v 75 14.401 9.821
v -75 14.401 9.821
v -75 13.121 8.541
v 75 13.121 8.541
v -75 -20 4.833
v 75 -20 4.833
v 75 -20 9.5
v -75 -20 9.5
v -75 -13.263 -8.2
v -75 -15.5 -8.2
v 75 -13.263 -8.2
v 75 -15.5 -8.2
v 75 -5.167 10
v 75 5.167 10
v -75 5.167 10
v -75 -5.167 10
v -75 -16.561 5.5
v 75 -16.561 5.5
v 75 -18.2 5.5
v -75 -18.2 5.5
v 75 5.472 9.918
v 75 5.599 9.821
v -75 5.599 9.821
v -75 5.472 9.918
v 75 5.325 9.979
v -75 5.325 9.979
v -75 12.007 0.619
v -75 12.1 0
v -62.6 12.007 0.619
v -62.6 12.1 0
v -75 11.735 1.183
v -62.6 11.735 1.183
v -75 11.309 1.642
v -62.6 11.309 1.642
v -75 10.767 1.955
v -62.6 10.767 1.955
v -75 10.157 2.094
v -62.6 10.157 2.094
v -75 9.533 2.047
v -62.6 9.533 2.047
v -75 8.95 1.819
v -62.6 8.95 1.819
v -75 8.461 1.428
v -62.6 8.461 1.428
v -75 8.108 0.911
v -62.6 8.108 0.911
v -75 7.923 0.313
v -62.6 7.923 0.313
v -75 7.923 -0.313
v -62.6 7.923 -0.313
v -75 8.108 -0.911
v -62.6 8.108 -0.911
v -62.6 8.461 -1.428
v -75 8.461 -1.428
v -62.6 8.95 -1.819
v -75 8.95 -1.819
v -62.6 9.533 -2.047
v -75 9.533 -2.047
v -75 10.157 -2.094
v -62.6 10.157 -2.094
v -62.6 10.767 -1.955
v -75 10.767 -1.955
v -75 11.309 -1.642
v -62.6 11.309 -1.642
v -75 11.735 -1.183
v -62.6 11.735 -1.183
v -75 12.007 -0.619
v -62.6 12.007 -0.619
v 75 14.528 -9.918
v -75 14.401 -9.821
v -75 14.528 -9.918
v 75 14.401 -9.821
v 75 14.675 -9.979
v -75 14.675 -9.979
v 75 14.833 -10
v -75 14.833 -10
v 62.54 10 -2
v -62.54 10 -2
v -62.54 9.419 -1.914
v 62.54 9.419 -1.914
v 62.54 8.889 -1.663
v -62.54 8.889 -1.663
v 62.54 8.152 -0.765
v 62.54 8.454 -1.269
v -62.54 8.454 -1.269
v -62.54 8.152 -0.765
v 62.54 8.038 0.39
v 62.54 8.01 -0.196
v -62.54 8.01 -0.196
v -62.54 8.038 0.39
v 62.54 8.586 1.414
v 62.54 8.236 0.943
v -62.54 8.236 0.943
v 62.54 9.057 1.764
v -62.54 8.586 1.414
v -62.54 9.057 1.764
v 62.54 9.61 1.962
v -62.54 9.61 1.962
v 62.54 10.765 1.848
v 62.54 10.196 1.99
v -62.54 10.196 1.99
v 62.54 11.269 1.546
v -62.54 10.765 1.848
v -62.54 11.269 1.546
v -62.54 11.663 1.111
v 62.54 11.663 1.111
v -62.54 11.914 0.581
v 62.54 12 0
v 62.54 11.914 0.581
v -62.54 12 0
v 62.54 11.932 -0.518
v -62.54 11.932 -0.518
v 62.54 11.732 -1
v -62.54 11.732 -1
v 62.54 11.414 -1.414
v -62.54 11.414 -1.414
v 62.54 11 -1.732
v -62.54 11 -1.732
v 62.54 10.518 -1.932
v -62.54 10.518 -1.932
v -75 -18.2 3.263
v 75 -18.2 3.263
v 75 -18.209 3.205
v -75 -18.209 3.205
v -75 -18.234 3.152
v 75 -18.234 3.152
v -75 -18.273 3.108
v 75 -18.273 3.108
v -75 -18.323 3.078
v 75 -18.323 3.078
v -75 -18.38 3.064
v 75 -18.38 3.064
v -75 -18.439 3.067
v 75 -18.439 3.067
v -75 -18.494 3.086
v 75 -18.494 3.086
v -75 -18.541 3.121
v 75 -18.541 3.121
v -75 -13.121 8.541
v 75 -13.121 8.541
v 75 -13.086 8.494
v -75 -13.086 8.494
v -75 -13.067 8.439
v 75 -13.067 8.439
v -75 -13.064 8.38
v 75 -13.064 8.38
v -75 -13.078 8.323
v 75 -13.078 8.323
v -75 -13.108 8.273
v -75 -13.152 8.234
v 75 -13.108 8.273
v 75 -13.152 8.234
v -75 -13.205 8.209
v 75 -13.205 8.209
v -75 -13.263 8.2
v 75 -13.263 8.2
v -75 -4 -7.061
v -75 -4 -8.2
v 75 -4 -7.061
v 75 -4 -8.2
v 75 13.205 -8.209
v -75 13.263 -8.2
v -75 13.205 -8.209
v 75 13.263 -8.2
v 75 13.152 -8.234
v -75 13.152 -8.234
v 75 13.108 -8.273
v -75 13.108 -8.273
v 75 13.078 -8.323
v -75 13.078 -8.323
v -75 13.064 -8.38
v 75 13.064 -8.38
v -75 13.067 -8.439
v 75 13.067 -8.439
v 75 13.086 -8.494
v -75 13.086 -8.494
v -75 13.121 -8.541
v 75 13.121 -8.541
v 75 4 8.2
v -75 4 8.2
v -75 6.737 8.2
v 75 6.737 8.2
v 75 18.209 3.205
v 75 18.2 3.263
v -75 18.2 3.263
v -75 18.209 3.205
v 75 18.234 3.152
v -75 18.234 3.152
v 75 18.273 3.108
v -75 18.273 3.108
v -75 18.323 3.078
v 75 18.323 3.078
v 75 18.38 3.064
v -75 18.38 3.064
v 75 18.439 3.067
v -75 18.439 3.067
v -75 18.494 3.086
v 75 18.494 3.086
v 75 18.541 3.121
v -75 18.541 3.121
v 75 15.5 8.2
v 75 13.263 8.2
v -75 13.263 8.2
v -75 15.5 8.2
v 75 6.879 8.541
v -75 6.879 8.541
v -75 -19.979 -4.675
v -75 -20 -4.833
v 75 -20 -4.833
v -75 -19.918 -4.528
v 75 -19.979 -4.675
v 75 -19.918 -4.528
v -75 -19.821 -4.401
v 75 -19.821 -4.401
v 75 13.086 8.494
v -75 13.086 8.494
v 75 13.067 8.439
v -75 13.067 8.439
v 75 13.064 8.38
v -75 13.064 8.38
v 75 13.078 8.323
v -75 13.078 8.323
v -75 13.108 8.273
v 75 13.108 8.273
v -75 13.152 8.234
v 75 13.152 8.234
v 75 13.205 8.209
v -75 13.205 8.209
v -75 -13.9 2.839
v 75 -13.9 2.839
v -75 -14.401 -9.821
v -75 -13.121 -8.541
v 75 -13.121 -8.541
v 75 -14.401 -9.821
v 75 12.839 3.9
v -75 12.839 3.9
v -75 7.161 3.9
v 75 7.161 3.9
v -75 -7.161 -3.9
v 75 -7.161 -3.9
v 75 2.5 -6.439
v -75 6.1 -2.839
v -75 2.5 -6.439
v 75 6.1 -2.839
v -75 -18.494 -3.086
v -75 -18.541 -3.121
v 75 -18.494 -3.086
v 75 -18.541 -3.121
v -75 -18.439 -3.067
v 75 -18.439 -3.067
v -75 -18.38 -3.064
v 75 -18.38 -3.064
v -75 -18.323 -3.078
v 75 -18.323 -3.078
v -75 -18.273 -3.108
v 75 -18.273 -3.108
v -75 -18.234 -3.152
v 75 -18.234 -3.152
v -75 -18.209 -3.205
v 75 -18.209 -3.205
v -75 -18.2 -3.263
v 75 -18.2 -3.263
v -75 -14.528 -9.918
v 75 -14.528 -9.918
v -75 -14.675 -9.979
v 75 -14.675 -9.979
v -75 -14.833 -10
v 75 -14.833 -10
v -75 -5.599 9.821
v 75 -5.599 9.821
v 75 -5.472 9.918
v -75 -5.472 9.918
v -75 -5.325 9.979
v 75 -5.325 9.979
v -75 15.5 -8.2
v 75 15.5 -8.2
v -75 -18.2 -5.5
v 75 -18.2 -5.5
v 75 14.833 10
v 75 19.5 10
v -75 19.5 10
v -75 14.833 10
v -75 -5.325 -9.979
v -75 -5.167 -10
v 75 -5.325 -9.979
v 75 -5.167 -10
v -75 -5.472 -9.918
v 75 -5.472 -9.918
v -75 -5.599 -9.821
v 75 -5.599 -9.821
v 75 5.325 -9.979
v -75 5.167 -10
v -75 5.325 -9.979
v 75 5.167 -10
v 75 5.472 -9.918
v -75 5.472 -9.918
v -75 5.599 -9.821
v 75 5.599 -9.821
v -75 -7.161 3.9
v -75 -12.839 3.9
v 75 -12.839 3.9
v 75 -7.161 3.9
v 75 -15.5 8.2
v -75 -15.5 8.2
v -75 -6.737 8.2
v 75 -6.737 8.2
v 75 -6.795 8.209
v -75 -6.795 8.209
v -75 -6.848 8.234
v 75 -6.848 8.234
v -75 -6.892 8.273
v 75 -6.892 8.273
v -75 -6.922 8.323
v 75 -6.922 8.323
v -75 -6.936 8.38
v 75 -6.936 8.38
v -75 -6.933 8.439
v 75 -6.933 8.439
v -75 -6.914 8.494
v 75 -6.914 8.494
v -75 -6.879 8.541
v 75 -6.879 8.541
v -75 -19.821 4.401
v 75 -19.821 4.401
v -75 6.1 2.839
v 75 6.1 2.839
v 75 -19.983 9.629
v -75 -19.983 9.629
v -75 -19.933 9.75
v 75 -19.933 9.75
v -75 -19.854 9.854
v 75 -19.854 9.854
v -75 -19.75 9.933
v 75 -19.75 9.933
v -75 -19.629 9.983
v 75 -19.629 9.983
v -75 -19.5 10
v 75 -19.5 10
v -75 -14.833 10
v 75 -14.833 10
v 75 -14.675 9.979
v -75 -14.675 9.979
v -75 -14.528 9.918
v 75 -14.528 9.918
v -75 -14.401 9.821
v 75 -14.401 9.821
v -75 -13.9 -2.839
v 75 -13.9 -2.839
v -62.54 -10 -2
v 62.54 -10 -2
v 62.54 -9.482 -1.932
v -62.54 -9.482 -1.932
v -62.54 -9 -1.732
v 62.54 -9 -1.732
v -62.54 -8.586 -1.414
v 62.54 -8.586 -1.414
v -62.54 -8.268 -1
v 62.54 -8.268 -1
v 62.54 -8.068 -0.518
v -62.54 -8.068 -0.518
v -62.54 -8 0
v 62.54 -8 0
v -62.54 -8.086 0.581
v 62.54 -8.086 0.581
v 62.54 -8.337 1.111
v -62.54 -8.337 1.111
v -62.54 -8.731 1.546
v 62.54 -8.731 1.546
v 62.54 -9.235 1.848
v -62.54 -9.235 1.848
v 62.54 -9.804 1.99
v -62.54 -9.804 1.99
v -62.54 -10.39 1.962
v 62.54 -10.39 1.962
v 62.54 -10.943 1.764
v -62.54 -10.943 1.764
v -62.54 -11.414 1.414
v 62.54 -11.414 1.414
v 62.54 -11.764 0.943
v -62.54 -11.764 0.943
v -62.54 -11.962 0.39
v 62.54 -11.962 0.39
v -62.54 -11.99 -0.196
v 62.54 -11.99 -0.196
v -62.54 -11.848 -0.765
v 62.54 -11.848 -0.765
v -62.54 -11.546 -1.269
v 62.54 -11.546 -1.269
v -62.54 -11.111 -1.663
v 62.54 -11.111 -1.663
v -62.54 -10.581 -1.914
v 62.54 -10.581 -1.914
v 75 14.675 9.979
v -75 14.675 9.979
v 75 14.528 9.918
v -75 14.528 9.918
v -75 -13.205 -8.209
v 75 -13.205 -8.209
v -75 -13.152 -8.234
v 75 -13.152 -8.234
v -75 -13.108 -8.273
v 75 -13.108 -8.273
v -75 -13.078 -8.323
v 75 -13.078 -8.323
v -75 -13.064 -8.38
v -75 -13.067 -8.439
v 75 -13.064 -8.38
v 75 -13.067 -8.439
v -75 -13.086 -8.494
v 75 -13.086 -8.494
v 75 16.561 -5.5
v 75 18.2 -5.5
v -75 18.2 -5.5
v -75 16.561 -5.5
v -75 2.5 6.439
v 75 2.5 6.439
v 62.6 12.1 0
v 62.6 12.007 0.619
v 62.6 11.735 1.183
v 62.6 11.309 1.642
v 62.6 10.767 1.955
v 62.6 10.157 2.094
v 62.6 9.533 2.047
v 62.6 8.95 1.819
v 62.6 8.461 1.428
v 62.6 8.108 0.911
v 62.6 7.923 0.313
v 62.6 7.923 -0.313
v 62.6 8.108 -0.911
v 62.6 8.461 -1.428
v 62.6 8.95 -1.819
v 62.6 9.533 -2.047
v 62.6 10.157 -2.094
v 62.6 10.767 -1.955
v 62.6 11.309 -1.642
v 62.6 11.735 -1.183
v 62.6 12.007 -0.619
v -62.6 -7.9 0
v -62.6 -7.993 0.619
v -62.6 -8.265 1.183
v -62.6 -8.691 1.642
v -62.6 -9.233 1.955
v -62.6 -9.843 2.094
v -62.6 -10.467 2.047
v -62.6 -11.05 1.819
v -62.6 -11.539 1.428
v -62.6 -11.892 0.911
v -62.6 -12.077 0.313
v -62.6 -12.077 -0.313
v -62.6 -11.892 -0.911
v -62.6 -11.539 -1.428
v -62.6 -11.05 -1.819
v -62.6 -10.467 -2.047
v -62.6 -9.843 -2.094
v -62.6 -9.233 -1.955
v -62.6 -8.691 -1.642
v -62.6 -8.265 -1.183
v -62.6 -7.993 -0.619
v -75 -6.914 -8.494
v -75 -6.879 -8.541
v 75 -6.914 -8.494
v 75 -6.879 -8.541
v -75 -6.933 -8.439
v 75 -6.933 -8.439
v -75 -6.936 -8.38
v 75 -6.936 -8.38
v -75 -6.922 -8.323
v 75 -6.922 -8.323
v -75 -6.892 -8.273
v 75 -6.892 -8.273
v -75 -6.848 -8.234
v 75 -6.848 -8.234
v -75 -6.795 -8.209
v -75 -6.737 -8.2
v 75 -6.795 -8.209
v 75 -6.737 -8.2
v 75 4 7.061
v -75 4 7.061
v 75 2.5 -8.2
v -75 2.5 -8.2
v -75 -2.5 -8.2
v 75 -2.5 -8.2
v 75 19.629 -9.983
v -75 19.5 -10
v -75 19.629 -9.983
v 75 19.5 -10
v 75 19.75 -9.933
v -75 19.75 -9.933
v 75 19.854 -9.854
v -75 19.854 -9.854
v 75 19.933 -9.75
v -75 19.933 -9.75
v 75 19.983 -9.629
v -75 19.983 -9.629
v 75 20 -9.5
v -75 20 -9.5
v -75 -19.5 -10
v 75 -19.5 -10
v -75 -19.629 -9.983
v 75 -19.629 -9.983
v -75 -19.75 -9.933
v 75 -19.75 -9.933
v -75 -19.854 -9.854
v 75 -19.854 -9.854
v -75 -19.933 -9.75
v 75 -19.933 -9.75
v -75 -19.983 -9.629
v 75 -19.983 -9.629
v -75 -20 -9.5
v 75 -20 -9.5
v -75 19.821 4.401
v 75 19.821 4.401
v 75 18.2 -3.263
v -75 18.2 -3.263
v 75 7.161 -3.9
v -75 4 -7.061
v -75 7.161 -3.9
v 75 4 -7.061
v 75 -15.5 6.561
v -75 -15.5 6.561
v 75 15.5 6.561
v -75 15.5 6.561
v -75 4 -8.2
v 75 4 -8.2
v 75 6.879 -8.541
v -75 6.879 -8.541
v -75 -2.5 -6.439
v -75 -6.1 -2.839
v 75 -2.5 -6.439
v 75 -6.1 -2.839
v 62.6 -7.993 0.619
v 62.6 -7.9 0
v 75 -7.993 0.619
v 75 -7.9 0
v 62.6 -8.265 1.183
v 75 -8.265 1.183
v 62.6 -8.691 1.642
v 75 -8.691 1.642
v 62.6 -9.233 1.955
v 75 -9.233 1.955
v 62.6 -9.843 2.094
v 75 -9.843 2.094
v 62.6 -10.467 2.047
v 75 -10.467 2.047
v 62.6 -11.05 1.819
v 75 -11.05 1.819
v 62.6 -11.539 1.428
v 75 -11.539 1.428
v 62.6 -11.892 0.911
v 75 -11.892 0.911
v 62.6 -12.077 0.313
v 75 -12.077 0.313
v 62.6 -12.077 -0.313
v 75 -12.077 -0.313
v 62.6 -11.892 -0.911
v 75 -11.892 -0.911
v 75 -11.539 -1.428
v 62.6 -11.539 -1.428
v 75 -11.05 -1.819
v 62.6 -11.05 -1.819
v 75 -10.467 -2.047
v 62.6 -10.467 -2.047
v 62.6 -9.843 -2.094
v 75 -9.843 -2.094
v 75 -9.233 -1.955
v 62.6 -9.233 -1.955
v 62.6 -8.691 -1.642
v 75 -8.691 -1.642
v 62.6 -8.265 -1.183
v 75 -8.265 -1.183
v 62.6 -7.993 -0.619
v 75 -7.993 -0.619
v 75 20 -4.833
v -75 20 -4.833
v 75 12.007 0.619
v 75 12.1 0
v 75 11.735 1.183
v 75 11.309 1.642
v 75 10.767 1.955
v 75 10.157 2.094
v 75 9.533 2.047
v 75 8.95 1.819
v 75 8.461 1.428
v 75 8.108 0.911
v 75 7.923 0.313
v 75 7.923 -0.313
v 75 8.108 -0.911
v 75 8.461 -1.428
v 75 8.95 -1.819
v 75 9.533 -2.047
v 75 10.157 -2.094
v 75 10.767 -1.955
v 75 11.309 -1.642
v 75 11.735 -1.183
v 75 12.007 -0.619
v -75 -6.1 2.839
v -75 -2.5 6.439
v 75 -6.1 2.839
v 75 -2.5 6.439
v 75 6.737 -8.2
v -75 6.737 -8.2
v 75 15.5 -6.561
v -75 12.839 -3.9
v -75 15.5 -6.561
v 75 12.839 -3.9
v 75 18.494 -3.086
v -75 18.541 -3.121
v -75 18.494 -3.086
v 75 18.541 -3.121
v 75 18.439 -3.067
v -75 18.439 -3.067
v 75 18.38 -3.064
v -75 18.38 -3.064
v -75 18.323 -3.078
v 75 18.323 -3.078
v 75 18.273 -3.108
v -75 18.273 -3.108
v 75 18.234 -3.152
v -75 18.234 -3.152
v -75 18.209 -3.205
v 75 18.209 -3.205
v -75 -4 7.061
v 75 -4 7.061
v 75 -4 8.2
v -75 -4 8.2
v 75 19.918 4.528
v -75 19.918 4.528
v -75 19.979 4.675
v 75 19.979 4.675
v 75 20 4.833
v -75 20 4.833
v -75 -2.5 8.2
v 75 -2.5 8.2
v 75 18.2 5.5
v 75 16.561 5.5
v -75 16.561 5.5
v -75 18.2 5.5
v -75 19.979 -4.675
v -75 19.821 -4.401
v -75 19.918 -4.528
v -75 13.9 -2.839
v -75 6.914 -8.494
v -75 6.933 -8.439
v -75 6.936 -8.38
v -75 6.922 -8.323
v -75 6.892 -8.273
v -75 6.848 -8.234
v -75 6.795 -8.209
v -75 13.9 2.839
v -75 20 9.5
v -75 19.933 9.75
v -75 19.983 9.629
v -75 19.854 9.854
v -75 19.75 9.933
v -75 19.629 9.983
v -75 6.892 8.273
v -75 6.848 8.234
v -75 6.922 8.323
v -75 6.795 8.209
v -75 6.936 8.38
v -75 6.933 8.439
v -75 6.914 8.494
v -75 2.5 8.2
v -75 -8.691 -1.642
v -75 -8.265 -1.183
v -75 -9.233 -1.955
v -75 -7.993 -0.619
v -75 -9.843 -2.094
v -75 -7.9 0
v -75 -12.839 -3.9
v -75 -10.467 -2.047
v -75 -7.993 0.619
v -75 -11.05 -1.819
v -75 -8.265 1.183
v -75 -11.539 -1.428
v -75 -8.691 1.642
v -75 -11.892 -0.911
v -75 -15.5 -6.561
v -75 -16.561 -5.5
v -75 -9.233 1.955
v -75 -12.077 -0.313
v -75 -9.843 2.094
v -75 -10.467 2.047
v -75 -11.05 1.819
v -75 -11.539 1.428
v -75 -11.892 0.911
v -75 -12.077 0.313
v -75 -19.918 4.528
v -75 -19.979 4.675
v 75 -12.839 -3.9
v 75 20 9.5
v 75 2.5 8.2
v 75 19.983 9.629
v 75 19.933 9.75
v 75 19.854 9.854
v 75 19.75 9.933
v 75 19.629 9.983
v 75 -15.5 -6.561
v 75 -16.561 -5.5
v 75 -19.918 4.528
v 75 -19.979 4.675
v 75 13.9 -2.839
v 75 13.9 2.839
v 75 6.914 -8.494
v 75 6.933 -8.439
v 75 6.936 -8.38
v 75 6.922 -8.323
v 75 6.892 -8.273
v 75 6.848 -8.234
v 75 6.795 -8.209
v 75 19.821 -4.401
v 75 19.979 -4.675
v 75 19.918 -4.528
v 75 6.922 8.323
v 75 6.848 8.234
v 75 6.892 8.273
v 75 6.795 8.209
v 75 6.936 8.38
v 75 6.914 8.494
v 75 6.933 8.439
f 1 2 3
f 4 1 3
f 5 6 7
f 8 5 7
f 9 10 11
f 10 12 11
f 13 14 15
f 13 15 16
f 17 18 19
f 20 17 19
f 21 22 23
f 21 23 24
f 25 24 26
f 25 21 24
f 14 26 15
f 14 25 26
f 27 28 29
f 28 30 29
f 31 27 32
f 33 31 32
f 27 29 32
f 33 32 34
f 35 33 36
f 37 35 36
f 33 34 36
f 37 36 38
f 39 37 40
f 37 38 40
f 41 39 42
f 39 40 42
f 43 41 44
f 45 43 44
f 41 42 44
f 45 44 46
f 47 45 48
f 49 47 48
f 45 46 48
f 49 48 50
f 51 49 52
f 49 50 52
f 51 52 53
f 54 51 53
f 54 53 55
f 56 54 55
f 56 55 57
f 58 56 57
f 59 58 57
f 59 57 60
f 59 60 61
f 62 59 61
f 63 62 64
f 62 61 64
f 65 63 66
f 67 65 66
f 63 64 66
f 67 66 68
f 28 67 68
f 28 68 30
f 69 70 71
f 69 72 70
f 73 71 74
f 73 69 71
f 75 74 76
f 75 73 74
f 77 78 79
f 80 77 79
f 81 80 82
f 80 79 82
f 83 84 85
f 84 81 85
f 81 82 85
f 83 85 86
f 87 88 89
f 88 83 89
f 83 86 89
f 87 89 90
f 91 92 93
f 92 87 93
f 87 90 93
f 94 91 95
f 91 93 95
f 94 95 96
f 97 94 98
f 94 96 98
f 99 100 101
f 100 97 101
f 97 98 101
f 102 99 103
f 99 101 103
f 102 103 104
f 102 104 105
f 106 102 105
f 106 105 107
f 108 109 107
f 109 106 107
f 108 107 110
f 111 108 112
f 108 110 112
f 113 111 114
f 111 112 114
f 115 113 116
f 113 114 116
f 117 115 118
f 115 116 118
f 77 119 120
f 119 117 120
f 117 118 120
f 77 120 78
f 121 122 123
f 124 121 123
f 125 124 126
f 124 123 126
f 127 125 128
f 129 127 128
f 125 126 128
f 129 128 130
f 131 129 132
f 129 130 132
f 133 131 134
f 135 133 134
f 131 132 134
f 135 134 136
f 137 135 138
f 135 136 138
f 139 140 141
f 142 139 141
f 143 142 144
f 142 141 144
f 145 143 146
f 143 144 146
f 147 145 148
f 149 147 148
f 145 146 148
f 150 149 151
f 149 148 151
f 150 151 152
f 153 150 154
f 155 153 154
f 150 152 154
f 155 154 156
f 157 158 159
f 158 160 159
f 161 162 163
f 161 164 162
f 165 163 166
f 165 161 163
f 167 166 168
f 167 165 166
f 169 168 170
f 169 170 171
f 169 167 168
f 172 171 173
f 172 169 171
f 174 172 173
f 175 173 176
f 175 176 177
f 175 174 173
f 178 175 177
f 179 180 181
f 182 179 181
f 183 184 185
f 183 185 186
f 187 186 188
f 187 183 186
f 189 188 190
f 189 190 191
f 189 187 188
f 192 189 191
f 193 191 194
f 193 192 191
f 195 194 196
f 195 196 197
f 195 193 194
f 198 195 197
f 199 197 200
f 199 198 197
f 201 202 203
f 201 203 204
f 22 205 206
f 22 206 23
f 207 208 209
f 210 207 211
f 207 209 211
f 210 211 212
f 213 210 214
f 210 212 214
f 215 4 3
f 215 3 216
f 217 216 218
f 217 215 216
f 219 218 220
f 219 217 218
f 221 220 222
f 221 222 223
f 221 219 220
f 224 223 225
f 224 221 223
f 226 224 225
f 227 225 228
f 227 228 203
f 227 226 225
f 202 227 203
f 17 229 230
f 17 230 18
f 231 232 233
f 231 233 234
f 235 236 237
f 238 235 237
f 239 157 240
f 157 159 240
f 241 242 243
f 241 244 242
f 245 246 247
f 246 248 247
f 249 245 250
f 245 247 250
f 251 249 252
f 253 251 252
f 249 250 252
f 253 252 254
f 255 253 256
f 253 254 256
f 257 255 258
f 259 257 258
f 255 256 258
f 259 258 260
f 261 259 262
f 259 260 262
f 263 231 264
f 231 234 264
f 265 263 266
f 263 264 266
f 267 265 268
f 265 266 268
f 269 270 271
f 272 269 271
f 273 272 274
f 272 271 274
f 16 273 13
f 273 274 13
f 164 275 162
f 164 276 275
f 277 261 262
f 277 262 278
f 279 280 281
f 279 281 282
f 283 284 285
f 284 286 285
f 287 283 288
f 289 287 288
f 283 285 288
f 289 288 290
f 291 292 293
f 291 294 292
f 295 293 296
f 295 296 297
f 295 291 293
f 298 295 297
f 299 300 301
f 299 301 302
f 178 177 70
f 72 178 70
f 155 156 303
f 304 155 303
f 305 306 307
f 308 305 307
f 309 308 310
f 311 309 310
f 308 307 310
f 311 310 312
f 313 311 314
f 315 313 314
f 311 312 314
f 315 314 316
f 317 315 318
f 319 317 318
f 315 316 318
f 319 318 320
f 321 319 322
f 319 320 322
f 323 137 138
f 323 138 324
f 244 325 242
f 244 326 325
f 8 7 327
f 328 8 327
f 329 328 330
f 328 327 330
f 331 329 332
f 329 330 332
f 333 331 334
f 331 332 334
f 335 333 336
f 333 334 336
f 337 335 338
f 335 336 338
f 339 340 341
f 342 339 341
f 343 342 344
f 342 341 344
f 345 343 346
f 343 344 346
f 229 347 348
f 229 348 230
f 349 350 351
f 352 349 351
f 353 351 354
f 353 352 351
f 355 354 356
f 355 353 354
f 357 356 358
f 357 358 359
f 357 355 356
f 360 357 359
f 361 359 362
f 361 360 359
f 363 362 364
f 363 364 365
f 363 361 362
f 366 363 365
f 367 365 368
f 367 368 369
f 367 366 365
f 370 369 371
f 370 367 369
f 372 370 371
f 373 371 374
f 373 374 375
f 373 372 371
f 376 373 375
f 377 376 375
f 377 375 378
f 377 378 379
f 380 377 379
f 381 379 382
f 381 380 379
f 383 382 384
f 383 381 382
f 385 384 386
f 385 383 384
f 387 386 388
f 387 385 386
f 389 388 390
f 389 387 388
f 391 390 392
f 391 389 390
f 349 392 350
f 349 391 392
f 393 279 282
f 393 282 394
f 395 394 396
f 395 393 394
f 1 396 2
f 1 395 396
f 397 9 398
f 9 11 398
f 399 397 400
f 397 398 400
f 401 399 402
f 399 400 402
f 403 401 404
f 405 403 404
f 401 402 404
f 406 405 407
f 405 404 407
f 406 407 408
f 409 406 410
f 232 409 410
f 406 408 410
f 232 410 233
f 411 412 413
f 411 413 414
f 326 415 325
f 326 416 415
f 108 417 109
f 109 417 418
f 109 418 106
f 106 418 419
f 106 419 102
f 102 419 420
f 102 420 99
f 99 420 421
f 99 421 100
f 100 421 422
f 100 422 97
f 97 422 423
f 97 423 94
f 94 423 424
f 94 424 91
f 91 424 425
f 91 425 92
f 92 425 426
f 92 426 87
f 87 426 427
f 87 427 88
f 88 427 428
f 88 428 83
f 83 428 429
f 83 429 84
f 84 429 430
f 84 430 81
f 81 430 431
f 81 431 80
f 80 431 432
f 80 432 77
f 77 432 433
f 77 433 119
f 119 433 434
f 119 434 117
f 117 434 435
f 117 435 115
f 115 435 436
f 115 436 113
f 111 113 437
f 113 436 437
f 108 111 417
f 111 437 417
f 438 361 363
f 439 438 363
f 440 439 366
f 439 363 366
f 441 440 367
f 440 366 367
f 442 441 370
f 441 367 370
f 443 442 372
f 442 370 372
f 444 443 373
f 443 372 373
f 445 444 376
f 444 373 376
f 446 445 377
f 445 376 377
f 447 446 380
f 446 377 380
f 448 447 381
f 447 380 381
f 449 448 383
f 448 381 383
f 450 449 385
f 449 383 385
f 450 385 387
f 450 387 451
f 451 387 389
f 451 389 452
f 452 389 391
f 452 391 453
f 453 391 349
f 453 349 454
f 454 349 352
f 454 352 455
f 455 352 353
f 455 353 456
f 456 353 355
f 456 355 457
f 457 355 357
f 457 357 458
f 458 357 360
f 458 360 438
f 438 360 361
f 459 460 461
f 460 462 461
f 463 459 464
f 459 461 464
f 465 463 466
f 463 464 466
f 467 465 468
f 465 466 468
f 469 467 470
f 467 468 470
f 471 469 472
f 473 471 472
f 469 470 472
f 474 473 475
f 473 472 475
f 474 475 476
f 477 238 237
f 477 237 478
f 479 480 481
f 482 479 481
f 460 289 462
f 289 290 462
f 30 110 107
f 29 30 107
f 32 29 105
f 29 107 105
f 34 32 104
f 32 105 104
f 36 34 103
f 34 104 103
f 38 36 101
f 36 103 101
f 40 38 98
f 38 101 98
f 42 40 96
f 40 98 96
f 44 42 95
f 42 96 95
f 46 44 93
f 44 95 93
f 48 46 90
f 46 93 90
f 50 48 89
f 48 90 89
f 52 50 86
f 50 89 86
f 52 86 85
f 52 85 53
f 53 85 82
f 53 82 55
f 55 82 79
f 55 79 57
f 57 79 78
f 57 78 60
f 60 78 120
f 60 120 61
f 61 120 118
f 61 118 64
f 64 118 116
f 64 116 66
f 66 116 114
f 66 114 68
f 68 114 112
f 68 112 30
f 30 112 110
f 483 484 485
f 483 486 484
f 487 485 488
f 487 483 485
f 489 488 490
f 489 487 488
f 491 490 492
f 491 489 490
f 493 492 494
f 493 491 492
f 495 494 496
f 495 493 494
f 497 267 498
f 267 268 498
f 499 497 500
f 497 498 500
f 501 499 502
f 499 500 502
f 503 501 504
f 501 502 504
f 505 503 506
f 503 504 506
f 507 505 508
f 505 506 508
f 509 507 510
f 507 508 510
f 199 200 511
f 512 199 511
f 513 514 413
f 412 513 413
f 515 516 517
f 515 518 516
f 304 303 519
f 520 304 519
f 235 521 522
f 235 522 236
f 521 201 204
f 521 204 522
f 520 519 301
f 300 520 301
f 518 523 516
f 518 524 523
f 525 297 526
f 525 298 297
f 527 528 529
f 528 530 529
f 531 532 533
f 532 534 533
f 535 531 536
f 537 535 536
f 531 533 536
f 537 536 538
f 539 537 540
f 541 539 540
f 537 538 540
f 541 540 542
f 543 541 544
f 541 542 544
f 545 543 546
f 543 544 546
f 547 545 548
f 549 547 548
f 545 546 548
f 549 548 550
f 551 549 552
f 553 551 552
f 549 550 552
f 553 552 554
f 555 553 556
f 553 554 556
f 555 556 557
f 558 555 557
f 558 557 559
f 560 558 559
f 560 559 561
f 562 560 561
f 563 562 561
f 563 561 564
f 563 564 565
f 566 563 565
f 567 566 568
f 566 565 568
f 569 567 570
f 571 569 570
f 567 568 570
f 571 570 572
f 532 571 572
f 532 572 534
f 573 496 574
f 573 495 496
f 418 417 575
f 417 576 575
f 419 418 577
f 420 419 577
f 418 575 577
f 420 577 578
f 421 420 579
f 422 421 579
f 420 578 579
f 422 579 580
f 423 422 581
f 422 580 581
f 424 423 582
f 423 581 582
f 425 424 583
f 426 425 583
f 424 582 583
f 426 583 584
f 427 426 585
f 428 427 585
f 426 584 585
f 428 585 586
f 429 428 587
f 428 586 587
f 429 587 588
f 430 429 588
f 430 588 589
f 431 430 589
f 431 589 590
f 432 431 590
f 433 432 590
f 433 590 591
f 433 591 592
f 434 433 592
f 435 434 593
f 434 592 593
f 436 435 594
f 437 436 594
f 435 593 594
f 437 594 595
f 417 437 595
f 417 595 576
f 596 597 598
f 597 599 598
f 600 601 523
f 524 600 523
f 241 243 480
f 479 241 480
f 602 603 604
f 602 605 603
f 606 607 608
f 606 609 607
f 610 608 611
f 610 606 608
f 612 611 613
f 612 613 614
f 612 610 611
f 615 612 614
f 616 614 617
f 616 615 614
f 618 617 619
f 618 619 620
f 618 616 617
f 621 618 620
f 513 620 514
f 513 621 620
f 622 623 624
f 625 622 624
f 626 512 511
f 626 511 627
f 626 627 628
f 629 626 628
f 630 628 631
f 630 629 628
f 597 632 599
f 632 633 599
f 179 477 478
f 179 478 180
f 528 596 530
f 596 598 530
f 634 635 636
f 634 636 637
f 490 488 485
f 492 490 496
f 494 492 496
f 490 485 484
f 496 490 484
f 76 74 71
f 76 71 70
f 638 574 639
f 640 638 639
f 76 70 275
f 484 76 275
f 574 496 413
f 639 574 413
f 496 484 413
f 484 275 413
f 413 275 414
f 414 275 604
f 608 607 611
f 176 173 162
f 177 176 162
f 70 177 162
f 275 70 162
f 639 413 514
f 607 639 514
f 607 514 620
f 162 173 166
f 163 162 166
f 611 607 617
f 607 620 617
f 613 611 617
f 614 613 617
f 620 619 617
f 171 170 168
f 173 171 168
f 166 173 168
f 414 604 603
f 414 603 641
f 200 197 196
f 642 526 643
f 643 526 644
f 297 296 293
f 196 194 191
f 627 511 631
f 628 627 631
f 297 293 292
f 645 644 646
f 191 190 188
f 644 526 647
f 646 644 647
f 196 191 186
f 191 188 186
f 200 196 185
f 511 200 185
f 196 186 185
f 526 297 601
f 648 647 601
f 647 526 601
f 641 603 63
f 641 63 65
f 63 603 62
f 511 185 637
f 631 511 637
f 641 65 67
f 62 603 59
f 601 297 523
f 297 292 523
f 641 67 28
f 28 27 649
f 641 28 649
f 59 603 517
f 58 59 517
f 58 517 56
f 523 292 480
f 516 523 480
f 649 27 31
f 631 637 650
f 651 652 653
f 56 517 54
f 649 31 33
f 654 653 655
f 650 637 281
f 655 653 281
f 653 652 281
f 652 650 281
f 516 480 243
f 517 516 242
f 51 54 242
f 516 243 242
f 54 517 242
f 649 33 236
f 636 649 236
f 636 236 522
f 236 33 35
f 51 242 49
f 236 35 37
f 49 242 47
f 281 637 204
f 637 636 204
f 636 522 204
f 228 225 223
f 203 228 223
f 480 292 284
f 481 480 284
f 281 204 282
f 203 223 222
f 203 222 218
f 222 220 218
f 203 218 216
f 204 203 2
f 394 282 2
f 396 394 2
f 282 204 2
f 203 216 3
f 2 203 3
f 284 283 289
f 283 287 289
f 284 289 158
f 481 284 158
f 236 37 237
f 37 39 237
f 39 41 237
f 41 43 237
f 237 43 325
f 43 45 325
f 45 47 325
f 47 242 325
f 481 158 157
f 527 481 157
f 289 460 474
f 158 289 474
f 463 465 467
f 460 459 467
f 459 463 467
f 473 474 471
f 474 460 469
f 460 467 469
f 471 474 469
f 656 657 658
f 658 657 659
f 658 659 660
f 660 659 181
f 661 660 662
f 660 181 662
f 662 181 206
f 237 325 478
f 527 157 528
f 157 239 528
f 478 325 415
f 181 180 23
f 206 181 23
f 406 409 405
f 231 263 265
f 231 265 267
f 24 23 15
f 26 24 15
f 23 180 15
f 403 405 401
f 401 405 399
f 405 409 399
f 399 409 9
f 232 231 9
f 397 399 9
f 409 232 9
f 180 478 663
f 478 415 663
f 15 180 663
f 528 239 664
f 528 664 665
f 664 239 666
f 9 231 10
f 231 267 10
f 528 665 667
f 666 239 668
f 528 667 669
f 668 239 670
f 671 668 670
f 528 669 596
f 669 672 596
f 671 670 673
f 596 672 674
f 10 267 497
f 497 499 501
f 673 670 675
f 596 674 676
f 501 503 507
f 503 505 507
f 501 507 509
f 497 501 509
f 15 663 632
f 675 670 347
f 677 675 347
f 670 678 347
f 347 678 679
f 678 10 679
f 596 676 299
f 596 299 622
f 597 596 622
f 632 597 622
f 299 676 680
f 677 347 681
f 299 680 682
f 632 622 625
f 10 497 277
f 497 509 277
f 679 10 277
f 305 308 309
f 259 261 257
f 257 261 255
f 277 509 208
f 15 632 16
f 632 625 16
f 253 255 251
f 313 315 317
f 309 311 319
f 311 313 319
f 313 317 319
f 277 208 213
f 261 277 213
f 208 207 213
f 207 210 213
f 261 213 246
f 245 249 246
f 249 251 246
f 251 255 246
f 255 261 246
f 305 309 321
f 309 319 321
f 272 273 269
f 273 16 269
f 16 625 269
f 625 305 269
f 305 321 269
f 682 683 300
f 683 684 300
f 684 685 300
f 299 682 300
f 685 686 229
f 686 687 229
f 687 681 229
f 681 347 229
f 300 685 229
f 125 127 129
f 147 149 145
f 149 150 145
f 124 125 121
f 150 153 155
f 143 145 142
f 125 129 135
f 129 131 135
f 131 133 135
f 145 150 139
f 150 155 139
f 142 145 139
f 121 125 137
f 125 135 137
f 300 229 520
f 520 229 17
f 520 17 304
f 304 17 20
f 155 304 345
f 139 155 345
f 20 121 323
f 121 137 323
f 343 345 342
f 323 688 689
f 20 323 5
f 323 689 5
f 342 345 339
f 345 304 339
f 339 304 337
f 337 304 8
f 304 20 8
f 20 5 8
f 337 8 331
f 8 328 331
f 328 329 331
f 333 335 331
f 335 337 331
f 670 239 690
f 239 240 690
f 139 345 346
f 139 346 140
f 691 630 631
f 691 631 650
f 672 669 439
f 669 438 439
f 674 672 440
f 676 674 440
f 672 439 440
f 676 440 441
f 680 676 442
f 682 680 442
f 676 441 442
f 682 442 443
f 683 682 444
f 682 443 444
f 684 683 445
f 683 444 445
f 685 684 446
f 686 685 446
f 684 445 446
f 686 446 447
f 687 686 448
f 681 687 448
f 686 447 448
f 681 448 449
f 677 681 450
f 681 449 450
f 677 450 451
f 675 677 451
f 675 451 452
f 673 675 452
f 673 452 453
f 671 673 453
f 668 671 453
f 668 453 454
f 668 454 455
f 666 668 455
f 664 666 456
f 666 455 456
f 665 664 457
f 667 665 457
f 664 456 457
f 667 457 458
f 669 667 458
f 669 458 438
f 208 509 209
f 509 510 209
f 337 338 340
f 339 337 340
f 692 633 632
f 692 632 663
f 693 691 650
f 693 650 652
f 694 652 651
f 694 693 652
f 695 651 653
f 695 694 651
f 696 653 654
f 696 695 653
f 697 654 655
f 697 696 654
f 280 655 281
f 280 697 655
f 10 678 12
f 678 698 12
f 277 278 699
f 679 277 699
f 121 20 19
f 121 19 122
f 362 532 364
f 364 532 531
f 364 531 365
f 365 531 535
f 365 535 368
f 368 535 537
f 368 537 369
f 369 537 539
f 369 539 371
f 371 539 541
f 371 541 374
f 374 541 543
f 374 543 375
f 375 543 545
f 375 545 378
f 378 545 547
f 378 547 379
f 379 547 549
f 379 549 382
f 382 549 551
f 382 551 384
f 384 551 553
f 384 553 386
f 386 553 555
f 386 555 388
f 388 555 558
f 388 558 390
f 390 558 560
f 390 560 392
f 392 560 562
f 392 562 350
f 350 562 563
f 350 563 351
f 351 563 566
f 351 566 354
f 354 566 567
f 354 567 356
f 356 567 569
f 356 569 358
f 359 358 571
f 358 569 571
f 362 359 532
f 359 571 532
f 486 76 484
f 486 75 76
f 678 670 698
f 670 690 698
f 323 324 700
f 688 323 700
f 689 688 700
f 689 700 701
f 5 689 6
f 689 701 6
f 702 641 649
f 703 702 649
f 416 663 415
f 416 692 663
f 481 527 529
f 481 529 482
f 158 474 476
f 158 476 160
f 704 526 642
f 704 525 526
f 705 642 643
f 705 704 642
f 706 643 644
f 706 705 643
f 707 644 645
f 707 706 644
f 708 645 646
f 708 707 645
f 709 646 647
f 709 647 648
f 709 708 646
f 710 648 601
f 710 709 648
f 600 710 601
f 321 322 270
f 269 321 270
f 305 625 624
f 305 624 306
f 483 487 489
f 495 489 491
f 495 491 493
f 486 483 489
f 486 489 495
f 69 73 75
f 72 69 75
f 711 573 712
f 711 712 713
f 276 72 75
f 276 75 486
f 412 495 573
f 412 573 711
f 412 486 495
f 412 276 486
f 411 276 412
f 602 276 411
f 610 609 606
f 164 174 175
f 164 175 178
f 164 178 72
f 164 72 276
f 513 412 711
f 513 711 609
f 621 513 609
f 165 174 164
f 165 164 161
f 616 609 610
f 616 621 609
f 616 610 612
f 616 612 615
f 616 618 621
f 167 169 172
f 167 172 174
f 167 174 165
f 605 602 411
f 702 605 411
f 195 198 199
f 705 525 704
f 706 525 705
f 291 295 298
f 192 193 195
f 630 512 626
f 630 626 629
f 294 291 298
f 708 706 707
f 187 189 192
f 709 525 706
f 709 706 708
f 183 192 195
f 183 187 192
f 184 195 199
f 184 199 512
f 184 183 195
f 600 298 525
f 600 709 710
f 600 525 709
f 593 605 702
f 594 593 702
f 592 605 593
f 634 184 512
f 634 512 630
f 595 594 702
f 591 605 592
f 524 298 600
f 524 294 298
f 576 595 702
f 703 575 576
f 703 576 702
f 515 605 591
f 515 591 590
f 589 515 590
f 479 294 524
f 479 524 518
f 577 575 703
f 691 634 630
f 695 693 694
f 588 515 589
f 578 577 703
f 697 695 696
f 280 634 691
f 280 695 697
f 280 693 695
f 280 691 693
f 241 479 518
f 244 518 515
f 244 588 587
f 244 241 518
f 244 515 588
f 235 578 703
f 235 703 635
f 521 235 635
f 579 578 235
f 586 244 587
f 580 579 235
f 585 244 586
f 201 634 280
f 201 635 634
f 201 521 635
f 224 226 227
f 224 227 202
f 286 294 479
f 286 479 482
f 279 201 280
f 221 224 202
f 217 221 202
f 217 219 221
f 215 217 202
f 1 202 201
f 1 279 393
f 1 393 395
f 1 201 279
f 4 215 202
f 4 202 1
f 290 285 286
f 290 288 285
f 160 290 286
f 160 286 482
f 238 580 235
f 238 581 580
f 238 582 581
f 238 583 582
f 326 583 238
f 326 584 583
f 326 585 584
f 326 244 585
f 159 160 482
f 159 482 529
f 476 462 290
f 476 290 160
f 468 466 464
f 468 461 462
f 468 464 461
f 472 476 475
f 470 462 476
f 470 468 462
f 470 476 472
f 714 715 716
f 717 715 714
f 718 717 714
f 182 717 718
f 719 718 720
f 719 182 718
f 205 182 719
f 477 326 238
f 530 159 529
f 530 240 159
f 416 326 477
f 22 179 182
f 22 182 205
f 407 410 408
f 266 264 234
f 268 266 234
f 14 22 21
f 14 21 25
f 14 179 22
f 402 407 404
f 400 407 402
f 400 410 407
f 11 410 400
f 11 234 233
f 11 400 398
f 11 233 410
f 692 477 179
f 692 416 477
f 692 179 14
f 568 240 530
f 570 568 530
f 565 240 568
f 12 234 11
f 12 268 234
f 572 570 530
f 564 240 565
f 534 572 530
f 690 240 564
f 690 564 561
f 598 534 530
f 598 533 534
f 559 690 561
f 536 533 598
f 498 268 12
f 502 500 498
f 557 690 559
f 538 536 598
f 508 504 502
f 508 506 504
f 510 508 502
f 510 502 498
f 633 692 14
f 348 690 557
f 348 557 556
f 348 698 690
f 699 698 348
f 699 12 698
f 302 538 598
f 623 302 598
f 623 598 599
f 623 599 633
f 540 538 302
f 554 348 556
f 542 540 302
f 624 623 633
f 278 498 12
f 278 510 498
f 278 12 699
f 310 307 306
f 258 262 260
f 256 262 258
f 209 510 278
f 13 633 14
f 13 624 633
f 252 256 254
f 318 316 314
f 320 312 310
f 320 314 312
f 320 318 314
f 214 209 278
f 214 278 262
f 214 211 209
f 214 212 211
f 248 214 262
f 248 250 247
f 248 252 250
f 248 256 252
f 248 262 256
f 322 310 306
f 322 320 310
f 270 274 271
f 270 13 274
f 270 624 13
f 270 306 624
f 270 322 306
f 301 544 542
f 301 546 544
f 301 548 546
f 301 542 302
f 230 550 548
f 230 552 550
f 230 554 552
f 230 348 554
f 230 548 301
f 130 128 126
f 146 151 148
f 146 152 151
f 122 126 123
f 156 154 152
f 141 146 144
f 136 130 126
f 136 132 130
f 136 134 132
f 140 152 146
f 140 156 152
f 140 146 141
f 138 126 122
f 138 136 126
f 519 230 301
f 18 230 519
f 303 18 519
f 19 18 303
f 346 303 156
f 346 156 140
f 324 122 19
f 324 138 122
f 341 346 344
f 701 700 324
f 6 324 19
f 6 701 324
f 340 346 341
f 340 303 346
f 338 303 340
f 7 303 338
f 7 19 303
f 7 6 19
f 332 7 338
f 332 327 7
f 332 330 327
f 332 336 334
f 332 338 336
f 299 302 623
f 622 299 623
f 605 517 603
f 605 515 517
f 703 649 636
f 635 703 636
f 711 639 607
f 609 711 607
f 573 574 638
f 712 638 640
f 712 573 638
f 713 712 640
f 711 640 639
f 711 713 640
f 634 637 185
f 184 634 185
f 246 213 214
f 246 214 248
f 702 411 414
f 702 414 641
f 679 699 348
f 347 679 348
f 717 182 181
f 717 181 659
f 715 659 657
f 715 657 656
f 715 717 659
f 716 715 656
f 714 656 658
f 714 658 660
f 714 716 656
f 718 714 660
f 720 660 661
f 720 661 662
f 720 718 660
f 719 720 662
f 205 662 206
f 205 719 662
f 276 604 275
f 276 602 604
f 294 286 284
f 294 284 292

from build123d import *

# Parameters (mm, degrees)
SKETCH1_R           = 2
BOSS_EXTRUDE1_DEPTH = 75


# Read off the part's stored shape, not the designer's step: M5 Tapped Hole1
with BuildPart() as part:
    # Sketch1 → Boss-Extrude1 (new, symmetric)
    with BuildSketch(Plane(origin=(0, 0, 0), x_dir=(0, 0, -1), z_dir=(1, 0, 0))):
        with BuildLine():
            Line((-10, 0), (-8.2, 0))
            Line((-8.2, 0), (-8.2, -2.5))
            Line((-8.2, -2.5), (-6.43933983, -2.5))
            Line((-6.43933983, -2.5), (-2.839339831, -6.099999999))
            Line((-2.839339831, -6.099999999), (2.839339828, -6.099999999))
            Line((2.839339828, -6.099999999), (6.439339829, -2.499999999))
            Line((6.439339829, -2.499999999), (8.2, -2.499999999))
            Line((8.2, -2.499999999), (8.2, 0))
            Line((8.2, 0), (10, 0))
            Line((10, 0), (10, -5.167329724))
            ThreePointArc((10, -5.167329724), (9.953566515, -5.400766617), (9.821335137, -5.59866486))
            Line((9.821335137, -5.59866486), (8.541421356, -6.87857864))
            ThreePointArc((8.541421356, -6.87857864), (8.323463314, -6.921933191), (8.2, -6.737157284))
            Line((8.2, -6.737157284), (8.2, -3.999999998))
            Line((8.2, -3.999999998), (7.06066017, -3.999999998))
            Line((7.06066017, -3.999999998), (3.9, -7.160660168))
            Line((3.9, -7.160660168), (3.9, -12.83933983))
            Line((3.9, -12.83933983), (6.560660169, -15.499999999))
            Line((6.560660169, -15.499999999), (8.2, -15.499999999))
            Line((8.2, -15.499999999), (8.2, -13.262842712))
            ThreePointArc((8.2, -13.262842712), (8.323463314, -13.078066805), (8.541421356, -13.121421355))
            Line((8.541421356, -13.121421355), (9.821335137, -14.401335136))
            ThreePointArc((9.821335137, -14.401335136), (9.953566515, -14.599233379), (10, -14.832670272))
            Line((10, -14.832670272), (10, -19.499999999))
            ThreePointArc((10, -19.499999999), (9.853553391, -19.85355339), (9.5, -19.999999999))
            Line((9.5, -19.999999999), (4.832670273, -19.999999999))
            ThreePointArc((4.832670273, -19.999999999), (4.599233379, -19.953566514), (4.401335137, -19.821335136))
            Line((4.401335137, -19.821335136), (3.121421356, -18.541421355))
            ThreePointArc((3.121421356, -18.541421355), (3.078066806, -18.323463313), (3.262842712, -18.199999999))
            Line((3.262842712, -18.199999999), (5.5, -18.199999999))
            Line((5.5, -18.199999999), (5.5, -16.560660171))
            Line((5.5, -16.560660171), (2.839339828, -13.899999999))
            Line((2.839339828, -13.899999999), (-2.839339828, -13.899999999))
            Line((-2.839339828, -13.899999999), (-5.5, -16.560660171))
            Line((-5.5, -16.560660171), (-5.5, -18.199999999))
            Line((-5.5, -18.199999999), (-3.262842712, -18.199999999))
            ThreePointArc((-3.262842712, -18.199999999), (-3.078066806, -18.323463313), (-3.121421356, -18.541421355))
            Line((-3.121421356, -18.541421355), (-4.401335137, -19.821335136))
            ThreePointArc((-4.401335137, -19.821335136), (-4.599233379, -19.953566514), (-4.832670273, -19.999999999))
            Line((-4.832670273, -19.999999999), (-9.5, -19.999999999))
            ThreePointArc((-9.5, -19.999999999), (-9.853553391, -19.85355339), (-10, -19.499999999))
            Line((-10, -19.499999999), (-10, -14.832670272))
            ThreePointArc((-10, -14.832670272), (-9.953566515, -14.599233379), (-9.821335137, -14.401335136))
            Line((-9.821335137, -14.401335136), (-8.541421356, -13.121421355))
            ThreePointArc((-8.541421356, -13.121421355), (-8.323463314, -13.078066805), (-8.2, -13.262842712))
            Line((-8.2, -13.262842712), (-8.2, -15.499999999))
            Line((-8.2, -15.499999999), (-6.560660172, -15.499999999))
            Line((-6.560660172, -15.499999999), (-3.9, -12.839339827))
            Line((-3.9, -12.839339827), (-3.9, -7.160660171))
            Line((-3.9, -7.160660171), (-7.06066017, -4.000000001))
            Line((-7.06066017, -4.000000001), (-8.2, -4.000000001))
            Line((-8.2, -4.000000001), (-8.2, -6.737157287))
            ThreePointArc((-8.2, -6.737157287), (-8.323463314, -6.921933193), (-8.541421356, -6.878578643))
            Line((-8.541421356, -6.878578643), (-9.821335137, -5.598664863))
            ThreePointArc((-9.821335137, -5.598664863), (-9.953566515, -5.40076662), (-10, -5.167329726))
            Line((-10, -5.167329726), (-10, 0))
        make_face()
        with Locations((0, -9.999999999)):
            Circle(SKETCH1_R, mode=Mode.SUBTRACT)
    boss_extrude1 = extrude(amount=BOSS_EXTRUDE1_DEPTH, both=True)


with BuildPart() as mirror1_1:
    # Mirror1: Boss-Extrude1 across Top Plane
    add(boss_extrude1.mirror(Plane(origin=(0, 0, 0), x_dir=(1, 0, 0), z_dir=(0, 1, 0))))


with BuildPart() as part_1:
    add(part.part)

    # Mirror1 united with what the copies touc: union Mirror1_1
    add(mirror1_1.part)

    # M5 Tapped Hole1 outline → M5 Tapped Hole1 (revolve, cut)
    with BuildSketch(Plane(origin=(0, 9.999999999, 0), x_dir=(0, 1, 0), z_dir=(0, 0, -1))):
        Polygon((2.1, -62.6), (2, -62.539913938), (2, -75), (2.1, -75), align=None)
        Polygon((2, 75), (2, 62.539913938), (2.1, 62.6), (2.1, 75), align=None)
    revolve(axis=Axis((0, 9.999999999, 0), (1, 0, 0)), mode=Mode.SUBTRACT)

    # M5 Tapped Hole1 2 outline → M5 Tapped Hole1 2 (revolve, cut)
    with BuildSketch(Plane(origin=(0, -9.999999999, 0), x_dir=(0, 1, 0), z_dir=(0, 0, -1))):
        Polygon((2.1, -62.6), (2, -62.539913938), (2, -75), (2.1, -75), align=None)
        Polygon((2, 75), (2, 62.539913938), (2.1, 62.6), (2.1, 75), align=None)
    revolve(axis=Axis((0, -9.999999999, 0), (1, 0, 0)), mode=Mode.SUBTRACT)


solid = part_1.part
